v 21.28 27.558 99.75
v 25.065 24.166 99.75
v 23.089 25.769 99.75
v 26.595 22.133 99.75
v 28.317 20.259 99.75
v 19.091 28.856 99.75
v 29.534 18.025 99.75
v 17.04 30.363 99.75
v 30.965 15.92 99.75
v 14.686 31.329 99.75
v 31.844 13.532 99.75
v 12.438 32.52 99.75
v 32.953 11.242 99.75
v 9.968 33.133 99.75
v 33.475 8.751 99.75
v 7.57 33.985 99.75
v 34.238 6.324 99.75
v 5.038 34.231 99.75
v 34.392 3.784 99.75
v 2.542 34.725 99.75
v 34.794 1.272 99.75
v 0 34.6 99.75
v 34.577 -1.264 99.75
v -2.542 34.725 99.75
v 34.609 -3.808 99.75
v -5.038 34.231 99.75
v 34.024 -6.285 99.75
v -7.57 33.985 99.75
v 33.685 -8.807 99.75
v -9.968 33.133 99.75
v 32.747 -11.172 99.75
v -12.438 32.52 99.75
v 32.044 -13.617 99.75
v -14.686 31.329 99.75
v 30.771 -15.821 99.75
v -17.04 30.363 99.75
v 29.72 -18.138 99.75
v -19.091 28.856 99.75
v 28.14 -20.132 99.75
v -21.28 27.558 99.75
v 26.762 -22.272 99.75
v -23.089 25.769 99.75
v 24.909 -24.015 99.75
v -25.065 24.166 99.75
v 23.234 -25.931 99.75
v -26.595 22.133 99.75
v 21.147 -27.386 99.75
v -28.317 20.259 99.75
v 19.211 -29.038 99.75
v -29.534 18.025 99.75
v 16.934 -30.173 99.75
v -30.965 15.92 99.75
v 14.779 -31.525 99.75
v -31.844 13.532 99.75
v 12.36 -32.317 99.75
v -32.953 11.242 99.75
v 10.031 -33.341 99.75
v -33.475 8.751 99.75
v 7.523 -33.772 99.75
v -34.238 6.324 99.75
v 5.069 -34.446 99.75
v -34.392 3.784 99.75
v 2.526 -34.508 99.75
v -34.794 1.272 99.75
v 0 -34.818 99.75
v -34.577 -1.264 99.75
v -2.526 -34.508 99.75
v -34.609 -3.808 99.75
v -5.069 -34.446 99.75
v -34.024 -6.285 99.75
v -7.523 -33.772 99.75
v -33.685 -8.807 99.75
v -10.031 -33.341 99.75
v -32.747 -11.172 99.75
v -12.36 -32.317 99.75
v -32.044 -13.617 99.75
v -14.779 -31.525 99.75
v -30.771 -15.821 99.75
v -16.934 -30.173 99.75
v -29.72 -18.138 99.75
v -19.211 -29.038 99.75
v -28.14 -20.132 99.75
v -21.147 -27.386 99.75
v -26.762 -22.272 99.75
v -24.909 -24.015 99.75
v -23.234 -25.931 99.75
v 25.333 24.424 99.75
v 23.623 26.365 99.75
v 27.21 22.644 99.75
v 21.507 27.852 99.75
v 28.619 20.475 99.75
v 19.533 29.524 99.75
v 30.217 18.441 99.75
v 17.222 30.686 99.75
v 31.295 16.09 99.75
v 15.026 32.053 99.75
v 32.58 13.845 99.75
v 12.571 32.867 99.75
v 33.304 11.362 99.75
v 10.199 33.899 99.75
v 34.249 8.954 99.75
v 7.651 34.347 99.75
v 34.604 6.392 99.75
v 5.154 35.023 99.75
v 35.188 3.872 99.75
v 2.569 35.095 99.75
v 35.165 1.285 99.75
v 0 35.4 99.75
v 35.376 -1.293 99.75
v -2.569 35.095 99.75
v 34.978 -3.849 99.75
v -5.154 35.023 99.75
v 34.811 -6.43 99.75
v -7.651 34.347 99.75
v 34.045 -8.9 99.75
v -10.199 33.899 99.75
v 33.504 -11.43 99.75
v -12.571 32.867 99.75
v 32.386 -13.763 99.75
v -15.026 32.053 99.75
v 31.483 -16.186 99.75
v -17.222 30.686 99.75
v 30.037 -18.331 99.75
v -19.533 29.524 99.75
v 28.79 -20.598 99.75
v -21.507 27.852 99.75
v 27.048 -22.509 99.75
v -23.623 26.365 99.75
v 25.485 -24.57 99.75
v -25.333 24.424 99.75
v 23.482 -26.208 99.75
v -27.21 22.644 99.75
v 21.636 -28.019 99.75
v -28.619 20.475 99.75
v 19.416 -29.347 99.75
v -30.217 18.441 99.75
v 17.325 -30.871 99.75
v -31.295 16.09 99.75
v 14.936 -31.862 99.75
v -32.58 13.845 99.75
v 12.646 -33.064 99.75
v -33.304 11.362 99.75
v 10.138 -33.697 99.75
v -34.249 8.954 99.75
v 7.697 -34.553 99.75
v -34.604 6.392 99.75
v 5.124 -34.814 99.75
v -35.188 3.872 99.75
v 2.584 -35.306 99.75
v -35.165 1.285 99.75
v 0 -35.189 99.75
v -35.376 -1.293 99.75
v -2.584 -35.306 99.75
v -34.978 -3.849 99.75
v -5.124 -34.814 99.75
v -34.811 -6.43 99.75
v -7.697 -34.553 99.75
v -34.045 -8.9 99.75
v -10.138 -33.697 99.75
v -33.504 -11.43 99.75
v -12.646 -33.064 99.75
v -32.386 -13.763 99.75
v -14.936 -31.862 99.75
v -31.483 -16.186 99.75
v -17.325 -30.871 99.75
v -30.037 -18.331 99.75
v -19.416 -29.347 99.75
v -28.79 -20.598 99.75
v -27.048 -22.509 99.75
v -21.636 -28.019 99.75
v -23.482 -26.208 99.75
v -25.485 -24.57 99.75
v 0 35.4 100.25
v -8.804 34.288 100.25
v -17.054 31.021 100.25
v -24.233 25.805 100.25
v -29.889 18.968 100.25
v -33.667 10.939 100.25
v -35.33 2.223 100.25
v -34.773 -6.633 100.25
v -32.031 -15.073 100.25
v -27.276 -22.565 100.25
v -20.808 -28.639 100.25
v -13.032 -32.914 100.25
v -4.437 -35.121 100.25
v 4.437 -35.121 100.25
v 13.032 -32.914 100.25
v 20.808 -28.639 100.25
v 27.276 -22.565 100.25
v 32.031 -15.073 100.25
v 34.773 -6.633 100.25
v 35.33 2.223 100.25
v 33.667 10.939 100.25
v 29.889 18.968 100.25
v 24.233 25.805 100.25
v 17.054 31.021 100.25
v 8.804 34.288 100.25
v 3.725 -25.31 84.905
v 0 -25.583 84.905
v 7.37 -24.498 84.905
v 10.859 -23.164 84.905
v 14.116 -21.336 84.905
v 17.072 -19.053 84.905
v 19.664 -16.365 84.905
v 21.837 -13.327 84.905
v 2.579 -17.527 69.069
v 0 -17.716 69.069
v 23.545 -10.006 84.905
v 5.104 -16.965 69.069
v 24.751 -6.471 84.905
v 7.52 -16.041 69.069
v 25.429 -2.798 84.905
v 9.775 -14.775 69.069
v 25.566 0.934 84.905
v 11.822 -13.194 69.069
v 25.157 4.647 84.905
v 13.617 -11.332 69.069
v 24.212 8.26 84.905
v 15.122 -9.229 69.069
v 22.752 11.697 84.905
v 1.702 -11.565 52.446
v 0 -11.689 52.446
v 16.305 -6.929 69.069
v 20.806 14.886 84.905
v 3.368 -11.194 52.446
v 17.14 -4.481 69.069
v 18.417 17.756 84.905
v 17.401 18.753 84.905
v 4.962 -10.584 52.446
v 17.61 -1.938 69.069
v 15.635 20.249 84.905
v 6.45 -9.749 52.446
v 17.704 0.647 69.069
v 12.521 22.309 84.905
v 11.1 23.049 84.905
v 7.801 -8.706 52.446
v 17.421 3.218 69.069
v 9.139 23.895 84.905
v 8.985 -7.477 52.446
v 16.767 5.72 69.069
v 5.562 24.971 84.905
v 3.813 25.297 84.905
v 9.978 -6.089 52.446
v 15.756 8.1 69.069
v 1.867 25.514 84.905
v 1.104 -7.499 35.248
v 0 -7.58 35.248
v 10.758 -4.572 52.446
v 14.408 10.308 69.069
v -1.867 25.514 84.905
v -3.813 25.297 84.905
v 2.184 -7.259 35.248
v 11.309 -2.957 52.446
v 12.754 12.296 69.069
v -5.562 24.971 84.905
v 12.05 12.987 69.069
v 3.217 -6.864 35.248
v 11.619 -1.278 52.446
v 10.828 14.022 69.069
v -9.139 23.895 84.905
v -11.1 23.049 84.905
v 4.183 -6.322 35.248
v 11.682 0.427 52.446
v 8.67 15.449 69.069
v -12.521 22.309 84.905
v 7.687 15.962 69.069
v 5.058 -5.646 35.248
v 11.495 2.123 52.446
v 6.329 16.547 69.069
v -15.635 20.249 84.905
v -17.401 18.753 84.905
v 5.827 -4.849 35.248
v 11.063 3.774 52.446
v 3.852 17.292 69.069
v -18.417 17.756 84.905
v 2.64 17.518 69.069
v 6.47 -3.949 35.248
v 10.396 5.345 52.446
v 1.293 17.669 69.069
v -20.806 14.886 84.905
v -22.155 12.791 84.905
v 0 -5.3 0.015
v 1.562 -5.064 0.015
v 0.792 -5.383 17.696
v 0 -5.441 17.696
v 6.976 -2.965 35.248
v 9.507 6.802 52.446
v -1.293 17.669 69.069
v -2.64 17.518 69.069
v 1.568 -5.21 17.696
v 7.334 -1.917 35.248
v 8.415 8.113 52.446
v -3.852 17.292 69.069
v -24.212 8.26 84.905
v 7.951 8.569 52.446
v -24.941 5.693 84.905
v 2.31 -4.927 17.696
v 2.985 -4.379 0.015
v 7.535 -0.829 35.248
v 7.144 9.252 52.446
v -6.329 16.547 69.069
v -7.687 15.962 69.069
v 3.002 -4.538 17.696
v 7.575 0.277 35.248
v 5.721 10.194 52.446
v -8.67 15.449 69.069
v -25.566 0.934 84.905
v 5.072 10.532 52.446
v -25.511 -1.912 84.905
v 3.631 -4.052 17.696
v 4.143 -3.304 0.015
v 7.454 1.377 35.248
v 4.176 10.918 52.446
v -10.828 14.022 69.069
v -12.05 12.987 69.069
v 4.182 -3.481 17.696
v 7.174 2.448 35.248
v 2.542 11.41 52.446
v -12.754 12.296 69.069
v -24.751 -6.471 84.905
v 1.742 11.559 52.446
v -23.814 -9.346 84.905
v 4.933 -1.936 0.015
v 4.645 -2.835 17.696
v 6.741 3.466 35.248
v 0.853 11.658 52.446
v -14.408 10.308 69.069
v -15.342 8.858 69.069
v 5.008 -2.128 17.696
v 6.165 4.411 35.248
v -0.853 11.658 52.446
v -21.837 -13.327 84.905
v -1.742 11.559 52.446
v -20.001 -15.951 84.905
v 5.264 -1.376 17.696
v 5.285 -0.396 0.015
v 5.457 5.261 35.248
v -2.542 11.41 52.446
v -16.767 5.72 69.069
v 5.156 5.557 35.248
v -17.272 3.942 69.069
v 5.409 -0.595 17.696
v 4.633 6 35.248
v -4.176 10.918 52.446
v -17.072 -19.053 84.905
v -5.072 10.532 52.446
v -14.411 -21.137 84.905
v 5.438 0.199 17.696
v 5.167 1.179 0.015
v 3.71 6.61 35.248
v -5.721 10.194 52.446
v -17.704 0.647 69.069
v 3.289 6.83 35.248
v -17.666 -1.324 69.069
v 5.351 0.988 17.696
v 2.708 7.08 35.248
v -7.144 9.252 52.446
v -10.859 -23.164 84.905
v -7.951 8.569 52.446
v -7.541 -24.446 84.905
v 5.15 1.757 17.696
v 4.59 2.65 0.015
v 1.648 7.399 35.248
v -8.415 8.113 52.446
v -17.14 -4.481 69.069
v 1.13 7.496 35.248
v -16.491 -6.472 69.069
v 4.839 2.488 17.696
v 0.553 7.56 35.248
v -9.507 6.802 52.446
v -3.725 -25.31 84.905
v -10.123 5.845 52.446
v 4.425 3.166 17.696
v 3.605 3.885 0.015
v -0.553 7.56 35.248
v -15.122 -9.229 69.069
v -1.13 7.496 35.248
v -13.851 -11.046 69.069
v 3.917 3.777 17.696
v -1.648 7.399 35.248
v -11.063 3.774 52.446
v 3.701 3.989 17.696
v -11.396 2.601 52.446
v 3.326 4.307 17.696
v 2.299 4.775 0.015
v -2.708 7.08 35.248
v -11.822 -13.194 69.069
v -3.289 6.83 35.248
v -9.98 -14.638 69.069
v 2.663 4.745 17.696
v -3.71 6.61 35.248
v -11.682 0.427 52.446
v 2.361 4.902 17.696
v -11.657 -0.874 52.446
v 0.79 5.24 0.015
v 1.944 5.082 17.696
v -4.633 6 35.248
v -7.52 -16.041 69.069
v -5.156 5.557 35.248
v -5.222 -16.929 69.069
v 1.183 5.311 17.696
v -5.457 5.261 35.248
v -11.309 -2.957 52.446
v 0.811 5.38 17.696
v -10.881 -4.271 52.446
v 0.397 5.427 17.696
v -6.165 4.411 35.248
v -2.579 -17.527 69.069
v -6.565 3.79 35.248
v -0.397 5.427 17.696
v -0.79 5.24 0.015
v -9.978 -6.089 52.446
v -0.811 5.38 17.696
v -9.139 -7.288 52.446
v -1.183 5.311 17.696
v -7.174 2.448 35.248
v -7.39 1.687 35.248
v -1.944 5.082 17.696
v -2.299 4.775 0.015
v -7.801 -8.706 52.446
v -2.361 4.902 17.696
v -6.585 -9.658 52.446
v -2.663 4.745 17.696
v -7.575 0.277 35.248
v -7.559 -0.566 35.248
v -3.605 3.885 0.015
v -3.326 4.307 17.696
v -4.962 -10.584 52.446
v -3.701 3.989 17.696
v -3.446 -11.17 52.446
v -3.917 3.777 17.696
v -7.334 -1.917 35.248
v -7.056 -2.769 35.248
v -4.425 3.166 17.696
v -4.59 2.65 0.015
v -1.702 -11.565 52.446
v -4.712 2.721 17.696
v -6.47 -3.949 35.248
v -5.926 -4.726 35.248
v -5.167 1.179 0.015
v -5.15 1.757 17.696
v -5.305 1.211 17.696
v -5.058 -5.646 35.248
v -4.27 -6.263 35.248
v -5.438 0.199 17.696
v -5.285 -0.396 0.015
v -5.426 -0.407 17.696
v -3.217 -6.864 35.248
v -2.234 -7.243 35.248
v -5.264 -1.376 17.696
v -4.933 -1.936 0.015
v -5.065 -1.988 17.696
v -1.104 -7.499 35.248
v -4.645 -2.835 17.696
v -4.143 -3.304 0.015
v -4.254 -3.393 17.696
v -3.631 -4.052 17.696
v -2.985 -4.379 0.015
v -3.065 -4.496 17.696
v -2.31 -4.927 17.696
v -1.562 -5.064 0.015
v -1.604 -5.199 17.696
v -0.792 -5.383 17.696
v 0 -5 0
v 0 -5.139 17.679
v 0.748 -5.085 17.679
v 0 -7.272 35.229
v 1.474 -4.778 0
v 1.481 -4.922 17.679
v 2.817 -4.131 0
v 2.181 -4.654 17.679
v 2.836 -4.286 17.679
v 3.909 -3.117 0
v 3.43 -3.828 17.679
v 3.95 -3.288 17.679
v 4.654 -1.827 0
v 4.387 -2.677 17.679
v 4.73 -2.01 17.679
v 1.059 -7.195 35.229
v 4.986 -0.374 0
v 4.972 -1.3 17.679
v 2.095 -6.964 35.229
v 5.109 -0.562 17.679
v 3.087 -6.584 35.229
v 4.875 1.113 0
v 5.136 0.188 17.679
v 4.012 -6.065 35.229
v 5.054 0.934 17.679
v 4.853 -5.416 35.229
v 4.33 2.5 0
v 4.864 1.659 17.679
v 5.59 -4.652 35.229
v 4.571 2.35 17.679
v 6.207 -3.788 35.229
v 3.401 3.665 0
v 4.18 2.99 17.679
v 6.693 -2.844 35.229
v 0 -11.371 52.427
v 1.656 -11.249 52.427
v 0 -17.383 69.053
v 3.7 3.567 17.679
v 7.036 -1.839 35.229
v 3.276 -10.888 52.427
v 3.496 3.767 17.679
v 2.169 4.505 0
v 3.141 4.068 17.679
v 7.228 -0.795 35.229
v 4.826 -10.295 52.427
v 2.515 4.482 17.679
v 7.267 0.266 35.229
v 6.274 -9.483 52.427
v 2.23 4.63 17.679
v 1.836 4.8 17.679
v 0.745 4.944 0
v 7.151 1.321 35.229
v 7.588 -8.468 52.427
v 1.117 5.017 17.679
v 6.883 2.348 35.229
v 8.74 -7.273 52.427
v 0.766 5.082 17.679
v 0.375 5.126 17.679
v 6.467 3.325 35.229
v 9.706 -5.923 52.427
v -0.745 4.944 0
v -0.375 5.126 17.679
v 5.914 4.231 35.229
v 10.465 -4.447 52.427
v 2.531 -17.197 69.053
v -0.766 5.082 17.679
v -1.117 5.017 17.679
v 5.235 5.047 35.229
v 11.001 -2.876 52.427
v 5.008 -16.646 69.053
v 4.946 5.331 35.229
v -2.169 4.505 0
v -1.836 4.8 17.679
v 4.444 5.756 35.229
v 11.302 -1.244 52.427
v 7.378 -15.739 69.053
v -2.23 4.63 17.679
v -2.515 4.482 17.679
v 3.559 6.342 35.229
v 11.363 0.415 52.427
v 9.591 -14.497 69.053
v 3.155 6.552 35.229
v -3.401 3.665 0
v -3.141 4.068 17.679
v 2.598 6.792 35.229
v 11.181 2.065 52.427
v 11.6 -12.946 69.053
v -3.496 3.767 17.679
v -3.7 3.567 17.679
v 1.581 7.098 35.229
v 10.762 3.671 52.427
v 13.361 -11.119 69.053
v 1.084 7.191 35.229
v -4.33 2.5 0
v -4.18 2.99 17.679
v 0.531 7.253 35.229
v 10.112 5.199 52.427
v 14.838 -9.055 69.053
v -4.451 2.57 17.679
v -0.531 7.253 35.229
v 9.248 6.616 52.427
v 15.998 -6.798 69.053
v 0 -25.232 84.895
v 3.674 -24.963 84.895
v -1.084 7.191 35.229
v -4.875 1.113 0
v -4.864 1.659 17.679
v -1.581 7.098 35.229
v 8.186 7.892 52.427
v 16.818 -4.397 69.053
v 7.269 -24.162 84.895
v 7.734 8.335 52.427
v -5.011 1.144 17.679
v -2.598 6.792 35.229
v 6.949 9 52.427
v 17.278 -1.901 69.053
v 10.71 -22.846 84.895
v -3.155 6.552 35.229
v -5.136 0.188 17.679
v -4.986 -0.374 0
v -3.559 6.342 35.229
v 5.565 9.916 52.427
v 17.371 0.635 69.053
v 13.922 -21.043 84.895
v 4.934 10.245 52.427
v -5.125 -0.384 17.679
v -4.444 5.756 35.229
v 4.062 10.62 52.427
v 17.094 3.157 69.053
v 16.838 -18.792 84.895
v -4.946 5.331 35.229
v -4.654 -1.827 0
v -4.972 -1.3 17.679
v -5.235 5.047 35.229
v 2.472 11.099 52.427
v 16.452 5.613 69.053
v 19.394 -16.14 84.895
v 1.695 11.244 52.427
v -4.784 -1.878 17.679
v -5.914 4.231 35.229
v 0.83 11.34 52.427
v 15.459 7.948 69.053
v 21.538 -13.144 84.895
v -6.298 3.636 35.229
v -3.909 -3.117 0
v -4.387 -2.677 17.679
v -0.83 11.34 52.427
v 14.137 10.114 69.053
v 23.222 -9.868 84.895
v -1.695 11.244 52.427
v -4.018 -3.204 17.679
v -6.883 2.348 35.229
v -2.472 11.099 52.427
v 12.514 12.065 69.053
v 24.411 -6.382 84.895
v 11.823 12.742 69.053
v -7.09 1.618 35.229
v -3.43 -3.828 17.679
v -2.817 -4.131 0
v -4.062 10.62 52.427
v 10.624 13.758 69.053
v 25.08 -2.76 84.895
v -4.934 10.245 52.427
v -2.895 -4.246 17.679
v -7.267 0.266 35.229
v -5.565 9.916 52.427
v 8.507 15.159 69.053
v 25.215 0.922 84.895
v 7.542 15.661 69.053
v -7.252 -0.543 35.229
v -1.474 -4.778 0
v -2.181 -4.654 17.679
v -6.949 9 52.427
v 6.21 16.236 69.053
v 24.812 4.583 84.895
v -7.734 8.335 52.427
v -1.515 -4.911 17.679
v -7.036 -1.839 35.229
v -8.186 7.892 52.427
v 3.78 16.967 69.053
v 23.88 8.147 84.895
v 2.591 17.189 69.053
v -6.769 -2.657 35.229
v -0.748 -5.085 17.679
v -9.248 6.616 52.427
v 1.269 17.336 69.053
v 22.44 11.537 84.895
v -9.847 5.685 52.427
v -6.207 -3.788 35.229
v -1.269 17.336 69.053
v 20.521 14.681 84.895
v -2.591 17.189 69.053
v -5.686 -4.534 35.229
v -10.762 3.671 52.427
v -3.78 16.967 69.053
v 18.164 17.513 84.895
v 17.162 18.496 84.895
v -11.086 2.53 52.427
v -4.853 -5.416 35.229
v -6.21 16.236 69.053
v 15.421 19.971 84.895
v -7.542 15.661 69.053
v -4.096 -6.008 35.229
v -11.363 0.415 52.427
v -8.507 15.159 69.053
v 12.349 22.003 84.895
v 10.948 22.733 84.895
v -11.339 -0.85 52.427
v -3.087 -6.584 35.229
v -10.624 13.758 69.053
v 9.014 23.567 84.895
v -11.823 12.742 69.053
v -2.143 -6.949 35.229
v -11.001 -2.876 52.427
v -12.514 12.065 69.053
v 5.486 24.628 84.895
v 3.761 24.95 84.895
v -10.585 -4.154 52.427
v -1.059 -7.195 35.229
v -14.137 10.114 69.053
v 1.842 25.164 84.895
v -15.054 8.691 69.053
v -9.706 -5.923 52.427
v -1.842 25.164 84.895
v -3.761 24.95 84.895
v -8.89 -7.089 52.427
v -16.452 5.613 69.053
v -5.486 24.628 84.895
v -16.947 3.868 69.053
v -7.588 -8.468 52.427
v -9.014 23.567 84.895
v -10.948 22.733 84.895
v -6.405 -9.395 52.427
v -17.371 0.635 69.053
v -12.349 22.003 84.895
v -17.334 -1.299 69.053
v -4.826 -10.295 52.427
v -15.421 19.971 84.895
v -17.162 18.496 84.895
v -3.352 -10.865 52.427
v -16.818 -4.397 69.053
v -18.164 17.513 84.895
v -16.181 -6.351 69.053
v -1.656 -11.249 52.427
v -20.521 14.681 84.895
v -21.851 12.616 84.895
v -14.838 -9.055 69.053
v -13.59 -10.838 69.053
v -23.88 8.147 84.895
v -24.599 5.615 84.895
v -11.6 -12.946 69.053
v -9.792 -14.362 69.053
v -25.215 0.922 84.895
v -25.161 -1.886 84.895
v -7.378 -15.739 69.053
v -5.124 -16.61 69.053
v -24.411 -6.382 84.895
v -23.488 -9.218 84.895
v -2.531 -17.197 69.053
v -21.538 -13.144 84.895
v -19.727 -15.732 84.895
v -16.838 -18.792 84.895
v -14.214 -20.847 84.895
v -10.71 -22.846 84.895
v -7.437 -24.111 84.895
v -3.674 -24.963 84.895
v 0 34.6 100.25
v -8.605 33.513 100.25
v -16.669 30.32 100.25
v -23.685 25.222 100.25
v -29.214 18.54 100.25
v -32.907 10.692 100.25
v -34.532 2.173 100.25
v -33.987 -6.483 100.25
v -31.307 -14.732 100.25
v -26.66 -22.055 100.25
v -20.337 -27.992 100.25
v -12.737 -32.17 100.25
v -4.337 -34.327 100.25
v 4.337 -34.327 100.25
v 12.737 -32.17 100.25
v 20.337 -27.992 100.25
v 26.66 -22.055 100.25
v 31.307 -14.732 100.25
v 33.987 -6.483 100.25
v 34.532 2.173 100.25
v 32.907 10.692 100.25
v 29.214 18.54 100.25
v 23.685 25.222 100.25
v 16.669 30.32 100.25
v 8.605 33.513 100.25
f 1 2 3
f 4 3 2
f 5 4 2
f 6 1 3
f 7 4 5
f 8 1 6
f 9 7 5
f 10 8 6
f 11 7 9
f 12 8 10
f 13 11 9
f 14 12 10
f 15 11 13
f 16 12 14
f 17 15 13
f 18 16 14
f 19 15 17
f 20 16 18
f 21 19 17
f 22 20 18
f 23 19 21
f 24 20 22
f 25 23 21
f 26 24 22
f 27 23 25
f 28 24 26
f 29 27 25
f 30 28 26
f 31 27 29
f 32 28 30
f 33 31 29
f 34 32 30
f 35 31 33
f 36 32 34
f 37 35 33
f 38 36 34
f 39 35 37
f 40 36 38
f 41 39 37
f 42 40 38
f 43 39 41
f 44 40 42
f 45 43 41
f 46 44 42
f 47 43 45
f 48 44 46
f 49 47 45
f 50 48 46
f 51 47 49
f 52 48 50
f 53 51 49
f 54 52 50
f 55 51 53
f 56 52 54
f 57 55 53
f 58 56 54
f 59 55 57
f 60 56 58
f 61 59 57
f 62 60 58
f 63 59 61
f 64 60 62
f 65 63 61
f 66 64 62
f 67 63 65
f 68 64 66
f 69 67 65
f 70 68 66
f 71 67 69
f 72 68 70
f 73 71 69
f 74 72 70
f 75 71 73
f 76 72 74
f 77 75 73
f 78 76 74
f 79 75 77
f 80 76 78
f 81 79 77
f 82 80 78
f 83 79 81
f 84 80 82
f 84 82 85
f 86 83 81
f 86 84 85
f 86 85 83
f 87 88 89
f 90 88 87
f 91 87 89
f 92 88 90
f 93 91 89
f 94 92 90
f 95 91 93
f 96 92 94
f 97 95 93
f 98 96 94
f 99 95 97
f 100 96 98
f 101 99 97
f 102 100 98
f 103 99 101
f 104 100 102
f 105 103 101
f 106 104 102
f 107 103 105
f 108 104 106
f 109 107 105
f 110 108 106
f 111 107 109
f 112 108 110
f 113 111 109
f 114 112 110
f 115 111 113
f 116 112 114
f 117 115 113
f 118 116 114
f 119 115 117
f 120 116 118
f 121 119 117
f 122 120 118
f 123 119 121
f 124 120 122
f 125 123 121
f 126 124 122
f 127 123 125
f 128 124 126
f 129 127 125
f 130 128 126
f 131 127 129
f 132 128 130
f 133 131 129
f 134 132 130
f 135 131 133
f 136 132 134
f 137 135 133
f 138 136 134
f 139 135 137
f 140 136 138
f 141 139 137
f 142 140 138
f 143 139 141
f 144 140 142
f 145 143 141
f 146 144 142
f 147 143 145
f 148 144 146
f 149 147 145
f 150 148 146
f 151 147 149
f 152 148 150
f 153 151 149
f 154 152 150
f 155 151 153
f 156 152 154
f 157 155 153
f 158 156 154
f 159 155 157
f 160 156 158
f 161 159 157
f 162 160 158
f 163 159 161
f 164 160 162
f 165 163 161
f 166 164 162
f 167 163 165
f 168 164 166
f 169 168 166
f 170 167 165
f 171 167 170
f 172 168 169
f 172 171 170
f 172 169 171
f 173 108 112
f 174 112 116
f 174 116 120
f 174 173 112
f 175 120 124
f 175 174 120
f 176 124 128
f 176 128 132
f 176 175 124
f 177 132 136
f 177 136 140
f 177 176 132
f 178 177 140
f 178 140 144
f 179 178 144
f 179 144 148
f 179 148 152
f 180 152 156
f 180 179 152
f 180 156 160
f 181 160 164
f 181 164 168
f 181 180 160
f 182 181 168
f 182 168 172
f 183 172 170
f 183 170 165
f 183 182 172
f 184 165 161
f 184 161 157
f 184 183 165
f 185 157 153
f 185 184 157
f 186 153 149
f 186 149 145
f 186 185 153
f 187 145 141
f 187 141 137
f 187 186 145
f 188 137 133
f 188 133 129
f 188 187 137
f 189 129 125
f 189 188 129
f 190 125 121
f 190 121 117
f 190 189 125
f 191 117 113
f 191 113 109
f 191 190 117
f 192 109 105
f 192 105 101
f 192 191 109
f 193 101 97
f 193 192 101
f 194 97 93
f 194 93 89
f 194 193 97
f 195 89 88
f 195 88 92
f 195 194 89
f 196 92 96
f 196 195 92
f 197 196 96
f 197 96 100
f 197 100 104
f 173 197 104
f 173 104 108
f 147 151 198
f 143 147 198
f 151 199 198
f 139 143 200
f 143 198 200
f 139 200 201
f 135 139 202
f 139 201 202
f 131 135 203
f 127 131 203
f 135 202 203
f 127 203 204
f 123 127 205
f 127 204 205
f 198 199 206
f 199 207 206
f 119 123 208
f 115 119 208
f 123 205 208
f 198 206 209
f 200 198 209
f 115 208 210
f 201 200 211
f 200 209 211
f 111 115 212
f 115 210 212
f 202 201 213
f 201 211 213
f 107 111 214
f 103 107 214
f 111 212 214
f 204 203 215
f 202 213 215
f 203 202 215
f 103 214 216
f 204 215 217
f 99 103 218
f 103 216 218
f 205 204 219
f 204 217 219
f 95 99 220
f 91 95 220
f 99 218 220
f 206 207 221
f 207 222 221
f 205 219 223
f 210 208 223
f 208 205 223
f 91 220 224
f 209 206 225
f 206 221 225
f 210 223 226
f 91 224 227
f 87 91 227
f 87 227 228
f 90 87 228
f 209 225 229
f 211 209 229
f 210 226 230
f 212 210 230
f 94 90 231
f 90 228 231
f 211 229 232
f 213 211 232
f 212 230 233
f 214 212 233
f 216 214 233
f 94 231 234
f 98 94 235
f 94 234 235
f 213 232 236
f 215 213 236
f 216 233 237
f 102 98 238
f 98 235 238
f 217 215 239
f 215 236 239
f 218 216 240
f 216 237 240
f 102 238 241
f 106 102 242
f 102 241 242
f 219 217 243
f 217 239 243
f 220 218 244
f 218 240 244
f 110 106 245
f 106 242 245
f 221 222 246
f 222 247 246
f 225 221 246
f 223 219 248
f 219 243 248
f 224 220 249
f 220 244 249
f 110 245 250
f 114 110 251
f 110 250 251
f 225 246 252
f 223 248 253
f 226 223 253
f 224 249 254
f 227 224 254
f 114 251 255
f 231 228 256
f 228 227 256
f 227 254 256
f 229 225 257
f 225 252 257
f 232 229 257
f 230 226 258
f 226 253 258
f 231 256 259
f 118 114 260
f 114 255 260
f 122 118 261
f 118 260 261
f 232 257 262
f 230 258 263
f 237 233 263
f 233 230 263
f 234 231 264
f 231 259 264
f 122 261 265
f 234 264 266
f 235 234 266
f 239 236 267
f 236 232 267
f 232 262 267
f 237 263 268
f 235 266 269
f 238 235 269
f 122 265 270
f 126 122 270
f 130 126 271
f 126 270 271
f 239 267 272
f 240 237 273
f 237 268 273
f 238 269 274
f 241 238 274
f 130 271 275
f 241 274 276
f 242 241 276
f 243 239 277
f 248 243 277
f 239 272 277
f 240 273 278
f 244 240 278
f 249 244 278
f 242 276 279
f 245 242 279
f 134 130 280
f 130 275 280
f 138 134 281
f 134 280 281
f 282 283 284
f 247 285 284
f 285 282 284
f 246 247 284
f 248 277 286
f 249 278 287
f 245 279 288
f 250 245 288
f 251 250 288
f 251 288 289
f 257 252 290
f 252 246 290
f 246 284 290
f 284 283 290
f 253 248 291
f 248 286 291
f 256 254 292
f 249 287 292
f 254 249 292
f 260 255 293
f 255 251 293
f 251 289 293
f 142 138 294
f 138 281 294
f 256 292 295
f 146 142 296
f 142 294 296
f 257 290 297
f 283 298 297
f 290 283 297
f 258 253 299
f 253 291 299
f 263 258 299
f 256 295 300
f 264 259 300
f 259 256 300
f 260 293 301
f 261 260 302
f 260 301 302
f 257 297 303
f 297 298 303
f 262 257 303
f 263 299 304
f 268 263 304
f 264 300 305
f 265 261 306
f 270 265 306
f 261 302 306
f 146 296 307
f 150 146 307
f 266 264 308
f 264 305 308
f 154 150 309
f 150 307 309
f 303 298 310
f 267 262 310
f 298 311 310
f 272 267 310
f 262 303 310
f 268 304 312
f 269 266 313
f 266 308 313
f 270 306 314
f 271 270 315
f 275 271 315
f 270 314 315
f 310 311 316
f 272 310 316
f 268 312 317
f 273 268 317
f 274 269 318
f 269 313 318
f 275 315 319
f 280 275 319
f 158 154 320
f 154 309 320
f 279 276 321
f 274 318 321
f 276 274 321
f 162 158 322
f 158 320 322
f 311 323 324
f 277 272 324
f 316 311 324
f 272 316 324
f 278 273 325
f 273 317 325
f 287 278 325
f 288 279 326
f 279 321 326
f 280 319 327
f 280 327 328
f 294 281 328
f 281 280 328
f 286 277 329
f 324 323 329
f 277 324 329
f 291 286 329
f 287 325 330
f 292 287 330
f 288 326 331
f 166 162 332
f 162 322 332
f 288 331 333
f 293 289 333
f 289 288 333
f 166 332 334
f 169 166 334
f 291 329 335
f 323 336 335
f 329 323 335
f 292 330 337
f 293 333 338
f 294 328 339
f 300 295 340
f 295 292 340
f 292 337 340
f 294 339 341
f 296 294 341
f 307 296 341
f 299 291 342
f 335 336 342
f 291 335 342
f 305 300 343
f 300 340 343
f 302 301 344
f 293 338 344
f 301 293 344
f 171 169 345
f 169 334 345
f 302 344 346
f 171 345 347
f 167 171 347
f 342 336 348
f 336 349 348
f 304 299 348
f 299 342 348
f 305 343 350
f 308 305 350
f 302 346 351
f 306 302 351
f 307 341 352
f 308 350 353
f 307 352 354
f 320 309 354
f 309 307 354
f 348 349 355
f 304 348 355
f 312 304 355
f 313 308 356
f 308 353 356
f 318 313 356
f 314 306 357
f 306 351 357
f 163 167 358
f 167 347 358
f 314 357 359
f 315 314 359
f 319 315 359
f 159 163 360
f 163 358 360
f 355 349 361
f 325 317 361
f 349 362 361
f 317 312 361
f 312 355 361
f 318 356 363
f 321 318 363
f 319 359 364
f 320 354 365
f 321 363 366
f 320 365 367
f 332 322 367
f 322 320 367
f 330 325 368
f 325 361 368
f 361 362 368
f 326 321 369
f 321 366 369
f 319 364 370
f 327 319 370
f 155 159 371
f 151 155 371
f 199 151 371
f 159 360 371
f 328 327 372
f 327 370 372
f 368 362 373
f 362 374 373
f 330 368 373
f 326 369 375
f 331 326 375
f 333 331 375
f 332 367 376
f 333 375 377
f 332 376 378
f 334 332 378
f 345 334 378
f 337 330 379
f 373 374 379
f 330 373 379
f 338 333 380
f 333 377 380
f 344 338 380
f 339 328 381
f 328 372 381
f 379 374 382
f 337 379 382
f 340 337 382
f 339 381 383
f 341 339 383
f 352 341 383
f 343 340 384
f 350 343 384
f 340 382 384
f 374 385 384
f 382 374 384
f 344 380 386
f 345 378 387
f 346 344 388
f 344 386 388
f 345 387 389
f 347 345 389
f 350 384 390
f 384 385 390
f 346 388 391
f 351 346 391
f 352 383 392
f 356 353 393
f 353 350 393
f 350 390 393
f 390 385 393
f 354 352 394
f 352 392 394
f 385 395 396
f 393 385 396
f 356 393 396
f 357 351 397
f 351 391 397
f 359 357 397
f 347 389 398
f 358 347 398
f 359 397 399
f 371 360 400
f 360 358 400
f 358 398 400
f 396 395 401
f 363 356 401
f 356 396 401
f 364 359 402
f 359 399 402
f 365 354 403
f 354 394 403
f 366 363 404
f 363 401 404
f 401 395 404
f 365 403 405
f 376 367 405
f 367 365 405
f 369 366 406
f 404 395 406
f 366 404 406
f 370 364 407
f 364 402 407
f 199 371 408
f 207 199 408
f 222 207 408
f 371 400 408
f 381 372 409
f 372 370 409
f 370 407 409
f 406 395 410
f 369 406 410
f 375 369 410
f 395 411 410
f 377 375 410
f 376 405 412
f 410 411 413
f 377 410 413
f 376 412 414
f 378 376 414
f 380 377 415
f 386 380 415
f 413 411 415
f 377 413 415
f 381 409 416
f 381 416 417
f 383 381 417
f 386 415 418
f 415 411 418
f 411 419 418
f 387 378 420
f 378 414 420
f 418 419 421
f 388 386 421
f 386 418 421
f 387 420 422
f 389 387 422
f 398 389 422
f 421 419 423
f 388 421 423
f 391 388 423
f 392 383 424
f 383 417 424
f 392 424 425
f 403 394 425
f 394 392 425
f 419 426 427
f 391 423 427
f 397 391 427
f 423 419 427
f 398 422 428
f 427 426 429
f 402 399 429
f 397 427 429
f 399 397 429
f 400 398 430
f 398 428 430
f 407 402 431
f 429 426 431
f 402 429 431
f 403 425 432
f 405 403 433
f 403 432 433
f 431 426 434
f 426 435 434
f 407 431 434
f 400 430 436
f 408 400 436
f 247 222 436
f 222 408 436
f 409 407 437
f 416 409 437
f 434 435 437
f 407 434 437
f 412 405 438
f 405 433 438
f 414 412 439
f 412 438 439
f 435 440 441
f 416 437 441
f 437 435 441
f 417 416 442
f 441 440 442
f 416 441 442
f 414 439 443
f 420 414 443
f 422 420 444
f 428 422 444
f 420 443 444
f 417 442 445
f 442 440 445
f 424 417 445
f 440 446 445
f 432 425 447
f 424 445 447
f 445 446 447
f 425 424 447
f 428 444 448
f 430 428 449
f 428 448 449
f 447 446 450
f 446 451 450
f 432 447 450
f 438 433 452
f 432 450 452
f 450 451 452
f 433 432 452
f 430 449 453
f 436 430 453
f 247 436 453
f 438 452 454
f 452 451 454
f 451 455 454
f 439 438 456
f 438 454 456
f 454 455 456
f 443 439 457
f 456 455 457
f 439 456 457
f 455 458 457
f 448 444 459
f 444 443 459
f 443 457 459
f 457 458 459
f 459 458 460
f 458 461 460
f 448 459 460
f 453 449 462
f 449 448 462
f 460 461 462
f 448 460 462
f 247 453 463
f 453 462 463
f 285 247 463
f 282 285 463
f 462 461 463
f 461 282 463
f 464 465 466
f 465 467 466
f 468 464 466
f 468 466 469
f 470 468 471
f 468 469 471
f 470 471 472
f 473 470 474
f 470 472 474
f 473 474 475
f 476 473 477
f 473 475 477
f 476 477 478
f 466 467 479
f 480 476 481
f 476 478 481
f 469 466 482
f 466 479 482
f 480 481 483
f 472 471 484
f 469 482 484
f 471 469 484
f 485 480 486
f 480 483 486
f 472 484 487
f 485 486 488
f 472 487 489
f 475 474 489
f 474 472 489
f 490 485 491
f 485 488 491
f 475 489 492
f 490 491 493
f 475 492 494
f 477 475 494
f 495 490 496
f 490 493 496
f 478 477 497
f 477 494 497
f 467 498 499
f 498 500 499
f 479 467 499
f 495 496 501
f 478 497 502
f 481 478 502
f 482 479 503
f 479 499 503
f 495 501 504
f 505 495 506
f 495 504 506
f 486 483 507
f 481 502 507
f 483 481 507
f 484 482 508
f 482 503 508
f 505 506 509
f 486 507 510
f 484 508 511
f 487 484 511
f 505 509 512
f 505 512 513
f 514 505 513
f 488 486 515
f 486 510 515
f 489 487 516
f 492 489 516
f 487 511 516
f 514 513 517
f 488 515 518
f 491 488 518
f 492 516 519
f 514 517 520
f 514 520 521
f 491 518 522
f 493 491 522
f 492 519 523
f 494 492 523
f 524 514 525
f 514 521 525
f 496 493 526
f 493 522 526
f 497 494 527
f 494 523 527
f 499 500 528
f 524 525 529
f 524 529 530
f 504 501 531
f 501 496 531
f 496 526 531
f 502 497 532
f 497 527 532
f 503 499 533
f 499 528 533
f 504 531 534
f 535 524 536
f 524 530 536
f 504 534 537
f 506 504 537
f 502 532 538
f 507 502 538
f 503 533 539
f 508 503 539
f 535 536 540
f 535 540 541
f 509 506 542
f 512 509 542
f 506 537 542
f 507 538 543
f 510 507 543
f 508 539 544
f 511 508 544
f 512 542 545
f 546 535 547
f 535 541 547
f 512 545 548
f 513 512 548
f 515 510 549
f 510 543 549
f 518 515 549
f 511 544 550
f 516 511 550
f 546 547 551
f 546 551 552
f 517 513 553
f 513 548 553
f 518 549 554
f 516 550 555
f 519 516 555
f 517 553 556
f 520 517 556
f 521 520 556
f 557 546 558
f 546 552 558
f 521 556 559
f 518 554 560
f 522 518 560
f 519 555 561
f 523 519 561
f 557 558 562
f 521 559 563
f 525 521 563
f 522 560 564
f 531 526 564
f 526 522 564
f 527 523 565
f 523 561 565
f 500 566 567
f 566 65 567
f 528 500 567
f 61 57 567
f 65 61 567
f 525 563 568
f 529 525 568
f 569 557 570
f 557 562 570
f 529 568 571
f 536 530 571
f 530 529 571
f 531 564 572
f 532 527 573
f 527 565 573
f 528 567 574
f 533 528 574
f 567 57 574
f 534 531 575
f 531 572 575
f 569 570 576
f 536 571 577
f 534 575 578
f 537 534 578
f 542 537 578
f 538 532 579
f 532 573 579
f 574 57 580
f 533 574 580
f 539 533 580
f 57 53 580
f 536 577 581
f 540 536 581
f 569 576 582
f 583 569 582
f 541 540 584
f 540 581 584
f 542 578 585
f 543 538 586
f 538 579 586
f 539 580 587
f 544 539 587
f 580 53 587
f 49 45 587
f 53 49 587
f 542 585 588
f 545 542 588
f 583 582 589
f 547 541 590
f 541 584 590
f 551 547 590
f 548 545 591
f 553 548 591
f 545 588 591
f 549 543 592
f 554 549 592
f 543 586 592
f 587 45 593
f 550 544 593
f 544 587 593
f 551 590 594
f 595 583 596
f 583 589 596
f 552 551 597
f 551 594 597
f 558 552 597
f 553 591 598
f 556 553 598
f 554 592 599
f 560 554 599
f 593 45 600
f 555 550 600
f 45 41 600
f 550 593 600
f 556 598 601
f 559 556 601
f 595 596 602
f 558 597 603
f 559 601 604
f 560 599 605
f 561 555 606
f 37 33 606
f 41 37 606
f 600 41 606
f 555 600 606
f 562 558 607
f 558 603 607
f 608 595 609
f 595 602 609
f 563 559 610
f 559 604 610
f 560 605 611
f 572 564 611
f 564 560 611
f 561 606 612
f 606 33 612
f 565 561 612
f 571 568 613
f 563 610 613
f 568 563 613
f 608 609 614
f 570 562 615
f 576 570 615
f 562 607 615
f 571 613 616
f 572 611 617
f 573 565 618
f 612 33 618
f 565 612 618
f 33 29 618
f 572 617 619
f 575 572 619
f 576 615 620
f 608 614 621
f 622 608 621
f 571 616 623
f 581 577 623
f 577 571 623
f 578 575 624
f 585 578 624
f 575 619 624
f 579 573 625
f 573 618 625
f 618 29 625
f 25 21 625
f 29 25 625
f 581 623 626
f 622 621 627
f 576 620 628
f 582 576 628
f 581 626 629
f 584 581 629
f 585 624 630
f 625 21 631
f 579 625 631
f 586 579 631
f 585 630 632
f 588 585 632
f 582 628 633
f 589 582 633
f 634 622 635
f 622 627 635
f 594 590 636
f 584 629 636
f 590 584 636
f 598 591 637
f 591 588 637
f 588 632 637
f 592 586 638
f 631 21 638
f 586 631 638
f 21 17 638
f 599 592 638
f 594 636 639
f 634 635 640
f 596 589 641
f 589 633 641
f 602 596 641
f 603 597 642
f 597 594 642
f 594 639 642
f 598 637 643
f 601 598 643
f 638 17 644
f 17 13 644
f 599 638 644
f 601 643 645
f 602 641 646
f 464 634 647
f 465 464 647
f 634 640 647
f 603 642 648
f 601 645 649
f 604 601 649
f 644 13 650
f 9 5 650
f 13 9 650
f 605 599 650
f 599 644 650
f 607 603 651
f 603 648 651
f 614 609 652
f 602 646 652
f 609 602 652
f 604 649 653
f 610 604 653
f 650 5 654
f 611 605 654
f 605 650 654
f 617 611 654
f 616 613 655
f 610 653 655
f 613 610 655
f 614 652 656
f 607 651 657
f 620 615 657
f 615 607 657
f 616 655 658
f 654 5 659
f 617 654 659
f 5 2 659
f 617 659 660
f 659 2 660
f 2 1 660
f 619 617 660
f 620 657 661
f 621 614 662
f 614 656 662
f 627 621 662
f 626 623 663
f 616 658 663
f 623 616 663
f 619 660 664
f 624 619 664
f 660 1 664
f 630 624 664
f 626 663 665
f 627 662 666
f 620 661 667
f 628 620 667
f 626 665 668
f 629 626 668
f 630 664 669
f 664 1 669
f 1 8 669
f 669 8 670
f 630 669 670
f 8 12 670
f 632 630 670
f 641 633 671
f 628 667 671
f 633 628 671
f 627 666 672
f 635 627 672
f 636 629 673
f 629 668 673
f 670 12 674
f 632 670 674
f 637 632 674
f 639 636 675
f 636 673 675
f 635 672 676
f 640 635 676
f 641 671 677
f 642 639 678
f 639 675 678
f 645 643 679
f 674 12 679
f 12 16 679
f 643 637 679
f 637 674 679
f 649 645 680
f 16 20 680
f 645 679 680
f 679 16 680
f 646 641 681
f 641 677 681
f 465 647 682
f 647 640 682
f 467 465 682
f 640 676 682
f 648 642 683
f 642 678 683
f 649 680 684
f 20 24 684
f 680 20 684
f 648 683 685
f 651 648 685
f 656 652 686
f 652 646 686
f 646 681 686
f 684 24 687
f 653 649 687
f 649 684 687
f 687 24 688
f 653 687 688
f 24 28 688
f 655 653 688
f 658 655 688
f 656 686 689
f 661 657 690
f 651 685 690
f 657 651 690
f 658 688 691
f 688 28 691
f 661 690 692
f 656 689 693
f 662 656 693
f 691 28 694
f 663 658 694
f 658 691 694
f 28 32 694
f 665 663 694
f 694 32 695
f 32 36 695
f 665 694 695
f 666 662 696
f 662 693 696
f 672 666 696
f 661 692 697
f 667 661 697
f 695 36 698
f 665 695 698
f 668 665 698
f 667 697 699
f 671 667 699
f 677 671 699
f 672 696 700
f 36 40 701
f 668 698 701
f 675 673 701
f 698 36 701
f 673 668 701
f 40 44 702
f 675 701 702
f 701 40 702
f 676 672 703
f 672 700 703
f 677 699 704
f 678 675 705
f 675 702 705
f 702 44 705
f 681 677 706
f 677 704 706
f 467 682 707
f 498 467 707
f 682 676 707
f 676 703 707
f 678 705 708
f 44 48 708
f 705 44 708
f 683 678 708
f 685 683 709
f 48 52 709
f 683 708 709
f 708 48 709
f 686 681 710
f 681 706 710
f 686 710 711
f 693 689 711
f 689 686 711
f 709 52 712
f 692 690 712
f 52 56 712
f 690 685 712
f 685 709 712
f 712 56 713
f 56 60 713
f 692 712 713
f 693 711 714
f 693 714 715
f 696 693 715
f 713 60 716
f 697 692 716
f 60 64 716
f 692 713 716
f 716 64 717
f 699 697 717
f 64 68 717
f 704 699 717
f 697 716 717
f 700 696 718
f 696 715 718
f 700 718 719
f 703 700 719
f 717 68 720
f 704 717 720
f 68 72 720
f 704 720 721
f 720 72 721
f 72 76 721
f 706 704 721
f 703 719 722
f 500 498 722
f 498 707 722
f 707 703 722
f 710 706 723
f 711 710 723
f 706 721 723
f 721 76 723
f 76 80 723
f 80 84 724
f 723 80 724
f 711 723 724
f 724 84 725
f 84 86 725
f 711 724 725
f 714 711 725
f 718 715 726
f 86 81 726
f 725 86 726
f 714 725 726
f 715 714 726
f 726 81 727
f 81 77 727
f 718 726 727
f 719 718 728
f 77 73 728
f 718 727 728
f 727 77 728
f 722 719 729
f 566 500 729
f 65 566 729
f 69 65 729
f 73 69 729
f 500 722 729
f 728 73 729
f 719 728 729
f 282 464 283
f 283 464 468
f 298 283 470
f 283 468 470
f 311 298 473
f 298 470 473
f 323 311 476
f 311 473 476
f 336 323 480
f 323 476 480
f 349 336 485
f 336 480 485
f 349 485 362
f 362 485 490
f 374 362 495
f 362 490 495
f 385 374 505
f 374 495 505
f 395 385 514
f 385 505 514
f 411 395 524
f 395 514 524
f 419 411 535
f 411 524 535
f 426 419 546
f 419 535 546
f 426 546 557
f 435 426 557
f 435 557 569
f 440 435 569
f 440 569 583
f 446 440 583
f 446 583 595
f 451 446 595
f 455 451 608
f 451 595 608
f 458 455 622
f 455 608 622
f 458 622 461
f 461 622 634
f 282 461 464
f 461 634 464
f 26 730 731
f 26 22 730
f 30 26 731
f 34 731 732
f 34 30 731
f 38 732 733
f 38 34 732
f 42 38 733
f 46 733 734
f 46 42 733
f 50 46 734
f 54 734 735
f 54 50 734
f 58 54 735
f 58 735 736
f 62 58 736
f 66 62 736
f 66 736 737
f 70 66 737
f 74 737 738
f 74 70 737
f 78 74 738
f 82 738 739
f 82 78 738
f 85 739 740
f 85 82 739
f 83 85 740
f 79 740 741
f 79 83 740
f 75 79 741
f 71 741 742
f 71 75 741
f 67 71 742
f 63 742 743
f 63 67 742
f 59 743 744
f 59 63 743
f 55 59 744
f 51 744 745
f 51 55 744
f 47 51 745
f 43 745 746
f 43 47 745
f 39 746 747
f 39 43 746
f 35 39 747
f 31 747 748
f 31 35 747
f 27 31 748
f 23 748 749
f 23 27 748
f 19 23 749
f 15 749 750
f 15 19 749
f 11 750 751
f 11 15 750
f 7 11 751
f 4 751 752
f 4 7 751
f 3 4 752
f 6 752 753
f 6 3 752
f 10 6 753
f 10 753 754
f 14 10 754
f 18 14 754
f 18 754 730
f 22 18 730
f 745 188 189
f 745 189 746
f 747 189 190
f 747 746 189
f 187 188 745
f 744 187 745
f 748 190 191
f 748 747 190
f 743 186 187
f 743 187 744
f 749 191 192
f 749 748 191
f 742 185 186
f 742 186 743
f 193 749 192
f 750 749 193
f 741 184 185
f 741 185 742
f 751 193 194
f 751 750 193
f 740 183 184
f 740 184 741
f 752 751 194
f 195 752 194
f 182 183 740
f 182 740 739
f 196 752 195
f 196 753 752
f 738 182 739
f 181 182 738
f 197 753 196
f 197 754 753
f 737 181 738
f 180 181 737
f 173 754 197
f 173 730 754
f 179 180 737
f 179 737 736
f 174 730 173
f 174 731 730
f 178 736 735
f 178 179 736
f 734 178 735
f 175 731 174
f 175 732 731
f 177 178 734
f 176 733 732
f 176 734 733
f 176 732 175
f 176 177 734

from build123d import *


with BuildPart() as f2:
    # F1 (on Right) → F2 (revolve)
    with BuildSketch(Plane.YZ):
        with BuildLine():
            Line((-5.299645, 0.014583), (-5, 0))
            ThreePointArc((-5, 0), (-11.414984, 52.575505), (-35, 100))
            Line((-35, 100), (-35.242136, 99.822883))
            ThreePointArc((-35.242136, 99.822883), (-11.702331, 52.489301), (-5.299645, 0.014583))
        make_face()
    revolve(axis=Axis((0, 0, 50), (0, 0, 1)))

    # F1 (on Right) → F3 (revolve)
    with BuildSketch(Plane.YZ):
        Polygon((34.6, 100.25), (34.6, 100), (34.6, 99.75), (35.4, 99.75), (35.4, 100.25), align=None)
    revolve(axis=Axis((0, 0, 50), (0, 0, 1)))


solid = f2.part
